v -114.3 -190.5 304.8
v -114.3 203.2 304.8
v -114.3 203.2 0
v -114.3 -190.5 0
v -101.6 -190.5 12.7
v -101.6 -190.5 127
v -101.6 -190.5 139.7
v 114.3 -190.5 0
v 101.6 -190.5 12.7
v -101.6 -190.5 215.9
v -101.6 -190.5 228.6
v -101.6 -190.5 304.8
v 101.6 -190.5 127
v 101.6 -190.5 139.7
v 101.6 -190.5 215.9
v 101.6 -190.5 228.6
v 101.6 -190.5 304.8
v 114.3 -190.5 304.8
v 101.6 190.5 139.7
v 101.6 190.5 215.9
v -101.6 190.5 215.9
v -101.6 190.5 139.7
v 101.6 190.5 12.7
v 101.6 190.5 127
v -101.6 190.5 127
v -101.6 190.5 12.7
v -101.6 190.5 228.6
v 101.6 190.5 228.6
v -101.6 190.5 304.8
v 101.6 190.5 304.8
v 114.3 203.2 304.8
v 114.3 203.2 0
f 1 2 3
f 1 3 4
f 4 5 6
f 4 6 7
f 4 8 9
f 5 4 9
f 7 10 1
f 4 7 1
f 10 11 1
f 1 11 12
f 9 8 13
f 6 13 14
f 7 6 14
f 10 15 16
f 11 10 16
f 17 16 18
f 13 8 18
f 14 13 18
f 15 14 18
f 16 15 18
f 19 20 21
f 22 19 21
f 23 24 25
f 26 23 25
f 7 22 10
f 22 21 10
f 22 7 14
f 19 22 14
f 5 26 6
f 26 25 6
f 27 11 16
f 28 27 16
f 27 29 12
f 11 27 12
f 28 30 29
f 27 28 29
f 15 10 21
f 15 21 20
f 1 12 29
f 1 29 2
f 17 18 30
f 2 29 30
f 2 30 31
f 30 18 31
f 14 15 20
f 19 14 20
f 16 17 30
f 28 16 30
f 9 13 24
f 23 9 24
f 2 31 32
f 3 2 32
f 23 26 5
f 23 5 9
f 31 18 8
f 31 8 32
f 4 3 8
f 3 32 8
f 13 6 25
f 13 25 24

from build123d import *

# Parameters (mm, degrees)
F0_W      = 203.2
F0_H      = 381
F1_DEPTH  = 12.7
F2_W      = 203.2
F2_H      = 292.1
F2_H_2    = 12.7
F3_DEPTH  = 12.7
F4_W      = 381
F4_H      = 292.1
F5_DEPTH  = 12.7
F6_W      = 381
F6_H      = 292.1
F7_DEPTH  = 12.7
F8_W      = 203.2
F8_H      = 12.7
F9_DEPTH  = 381
F10_W     = 203.2
F10_H     = 12.7
F11_DEPTH = 381


with BuildPart() as f1:
    # F0 (on Top) → F1 (new body)
    with BuildSketch(Plane.XY):
        Rectangle(F0_W, F0_H)
    extrude(amount=F1_DEPTH)

    # F2 (on face) → F3 (join)
    with BuildSketch(Plane(origin=(0, 190.5, 0), x_dir=(-1, 0, 0), z_dir=(0, 1, 0))):
        with Locations((0, 158.75)):
            Rectangle(F2_W, F2_H)
        with Locations((0, 6.35)):
            Rectangle(F2_W, F2_H_2)
    extrude(amount=F3_DEPTH)

    # F4 (on face) → F5 (join)
    with BuildSketch(Plane.YZ.offset(101.6)):
        with Locations((0, 158.75)):
            Rectangle(F4_W, F4_H)
        Polygon((-190.5, 0), (203.2, 0), (203.2, 304.8), (190.5, 304.8), (190.5, 12.7), (-190.5, 12.7), align=None)
    extrude(amount=F5_DEPTH)

    # F6 (on face) → F7 (join)
    with BuildSketch(Plane(origin=(-101.6, 0, 0), x_dir=(0, -1, 0), z_dir=(-1, 0, 0))):
        Polygon((-203.2, 304.8), (-203.2, 0), (190.5, 0), (190.5, 12.7), (-190.5, 12.7), (-190.5, 304.8), align=None)
        with Locations((0, 158.75)):
            Rectangle(F6_W, F6_H)
    extrude(amount=F7_DEPTH)

    # F8 (on face) → F9 (join)
    with BuildSketch(Plane.XZ.offset(-190.5)):
        with Locations((0, 222.25)):
            Rectangle(F8_W, F8_H)
    extrude(amount=F9_DEPTH)

    # F10 (on face) → F11 (join)
    with BuildSketch(Plane.XZ.offset(-190.5)):
        with Locations((0, 133.35)):
            Rectangle(F10_W, F10_H)
    extrude(amount=F11_DEPTH)


solid = f1.part
